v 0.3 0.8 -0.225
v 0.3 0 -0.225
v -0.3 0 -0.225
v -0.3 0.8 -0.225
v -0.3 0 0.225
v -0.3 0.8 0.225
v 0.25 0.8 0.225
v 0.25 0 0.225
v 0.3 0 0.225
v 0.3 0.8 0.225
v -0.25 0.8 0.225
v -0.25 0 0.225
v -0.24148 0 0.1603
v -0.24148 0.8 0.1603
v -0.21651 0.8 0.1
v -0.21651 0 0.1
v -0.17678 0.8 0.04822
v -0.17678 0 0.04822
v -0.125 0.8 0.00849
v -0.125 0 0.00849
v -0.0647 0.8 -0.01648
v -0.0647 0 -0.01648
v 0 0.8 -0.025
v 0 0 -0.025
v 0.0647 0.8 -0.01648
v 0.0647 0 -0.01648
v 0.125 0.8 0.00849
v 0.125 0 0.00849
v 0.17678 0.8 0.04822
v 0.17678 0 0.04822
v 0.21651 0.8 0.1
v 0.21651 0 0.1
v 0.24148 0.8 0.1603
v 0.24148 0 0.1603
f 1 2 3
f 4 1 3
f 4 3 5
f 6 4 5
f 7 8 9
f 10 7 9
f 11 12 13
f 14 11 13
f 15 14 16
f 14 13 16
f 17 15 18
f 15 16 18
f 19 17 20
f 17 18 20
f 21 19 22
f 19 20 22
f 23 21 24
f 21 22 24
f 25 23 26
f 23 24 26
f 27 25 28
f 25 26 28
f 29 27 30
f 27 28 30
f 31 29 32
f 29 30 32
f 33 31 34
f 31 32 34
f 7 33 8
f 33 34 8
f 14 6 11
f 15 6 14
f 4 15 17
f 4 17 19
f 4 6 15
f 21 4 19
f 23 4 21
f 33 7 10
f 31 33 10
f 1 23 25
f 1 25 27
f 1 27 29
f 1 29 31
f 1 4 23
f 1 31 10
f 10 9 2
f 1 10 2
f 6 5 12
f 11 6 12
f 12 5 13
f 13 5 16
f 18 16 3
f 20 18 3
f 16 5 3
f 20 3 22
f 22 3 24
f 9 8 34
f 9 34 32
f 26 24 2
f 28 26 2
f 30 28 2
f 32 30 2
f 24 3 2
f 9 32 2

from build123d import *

# Parameters (mm, degrees)
BOSS_EXTRU_1_DEPTH = 0.8


with BuildPart() as part:
    # Esquisse1 → Boss.-Extru.1 (new body)
    with BuildSketch(Plane(origin=(0, 0, 0), x_dir=(1, 0, 0), z_dir=(0, 1, 0))):
        with BuildLine():
            Line((0.25, -0.225), (0.3, -0.225))
            Line((0.3, -0.225), (0.3, 0.225))
            Line((0.3, 0.225), (-0.3, 0.225))
            Line((-0.3, 0.225), (-0.3, -0.225))
            Line((-0.3, -0.225), (-0.25, -0.225))
            ThreePointArc((-0.25, -0.225), (0, 0.025), (0.25, -0.225))
        make_face()
    extrude(amount=BOSS_EXTRU_1_DEPTH)


solid = part.part
